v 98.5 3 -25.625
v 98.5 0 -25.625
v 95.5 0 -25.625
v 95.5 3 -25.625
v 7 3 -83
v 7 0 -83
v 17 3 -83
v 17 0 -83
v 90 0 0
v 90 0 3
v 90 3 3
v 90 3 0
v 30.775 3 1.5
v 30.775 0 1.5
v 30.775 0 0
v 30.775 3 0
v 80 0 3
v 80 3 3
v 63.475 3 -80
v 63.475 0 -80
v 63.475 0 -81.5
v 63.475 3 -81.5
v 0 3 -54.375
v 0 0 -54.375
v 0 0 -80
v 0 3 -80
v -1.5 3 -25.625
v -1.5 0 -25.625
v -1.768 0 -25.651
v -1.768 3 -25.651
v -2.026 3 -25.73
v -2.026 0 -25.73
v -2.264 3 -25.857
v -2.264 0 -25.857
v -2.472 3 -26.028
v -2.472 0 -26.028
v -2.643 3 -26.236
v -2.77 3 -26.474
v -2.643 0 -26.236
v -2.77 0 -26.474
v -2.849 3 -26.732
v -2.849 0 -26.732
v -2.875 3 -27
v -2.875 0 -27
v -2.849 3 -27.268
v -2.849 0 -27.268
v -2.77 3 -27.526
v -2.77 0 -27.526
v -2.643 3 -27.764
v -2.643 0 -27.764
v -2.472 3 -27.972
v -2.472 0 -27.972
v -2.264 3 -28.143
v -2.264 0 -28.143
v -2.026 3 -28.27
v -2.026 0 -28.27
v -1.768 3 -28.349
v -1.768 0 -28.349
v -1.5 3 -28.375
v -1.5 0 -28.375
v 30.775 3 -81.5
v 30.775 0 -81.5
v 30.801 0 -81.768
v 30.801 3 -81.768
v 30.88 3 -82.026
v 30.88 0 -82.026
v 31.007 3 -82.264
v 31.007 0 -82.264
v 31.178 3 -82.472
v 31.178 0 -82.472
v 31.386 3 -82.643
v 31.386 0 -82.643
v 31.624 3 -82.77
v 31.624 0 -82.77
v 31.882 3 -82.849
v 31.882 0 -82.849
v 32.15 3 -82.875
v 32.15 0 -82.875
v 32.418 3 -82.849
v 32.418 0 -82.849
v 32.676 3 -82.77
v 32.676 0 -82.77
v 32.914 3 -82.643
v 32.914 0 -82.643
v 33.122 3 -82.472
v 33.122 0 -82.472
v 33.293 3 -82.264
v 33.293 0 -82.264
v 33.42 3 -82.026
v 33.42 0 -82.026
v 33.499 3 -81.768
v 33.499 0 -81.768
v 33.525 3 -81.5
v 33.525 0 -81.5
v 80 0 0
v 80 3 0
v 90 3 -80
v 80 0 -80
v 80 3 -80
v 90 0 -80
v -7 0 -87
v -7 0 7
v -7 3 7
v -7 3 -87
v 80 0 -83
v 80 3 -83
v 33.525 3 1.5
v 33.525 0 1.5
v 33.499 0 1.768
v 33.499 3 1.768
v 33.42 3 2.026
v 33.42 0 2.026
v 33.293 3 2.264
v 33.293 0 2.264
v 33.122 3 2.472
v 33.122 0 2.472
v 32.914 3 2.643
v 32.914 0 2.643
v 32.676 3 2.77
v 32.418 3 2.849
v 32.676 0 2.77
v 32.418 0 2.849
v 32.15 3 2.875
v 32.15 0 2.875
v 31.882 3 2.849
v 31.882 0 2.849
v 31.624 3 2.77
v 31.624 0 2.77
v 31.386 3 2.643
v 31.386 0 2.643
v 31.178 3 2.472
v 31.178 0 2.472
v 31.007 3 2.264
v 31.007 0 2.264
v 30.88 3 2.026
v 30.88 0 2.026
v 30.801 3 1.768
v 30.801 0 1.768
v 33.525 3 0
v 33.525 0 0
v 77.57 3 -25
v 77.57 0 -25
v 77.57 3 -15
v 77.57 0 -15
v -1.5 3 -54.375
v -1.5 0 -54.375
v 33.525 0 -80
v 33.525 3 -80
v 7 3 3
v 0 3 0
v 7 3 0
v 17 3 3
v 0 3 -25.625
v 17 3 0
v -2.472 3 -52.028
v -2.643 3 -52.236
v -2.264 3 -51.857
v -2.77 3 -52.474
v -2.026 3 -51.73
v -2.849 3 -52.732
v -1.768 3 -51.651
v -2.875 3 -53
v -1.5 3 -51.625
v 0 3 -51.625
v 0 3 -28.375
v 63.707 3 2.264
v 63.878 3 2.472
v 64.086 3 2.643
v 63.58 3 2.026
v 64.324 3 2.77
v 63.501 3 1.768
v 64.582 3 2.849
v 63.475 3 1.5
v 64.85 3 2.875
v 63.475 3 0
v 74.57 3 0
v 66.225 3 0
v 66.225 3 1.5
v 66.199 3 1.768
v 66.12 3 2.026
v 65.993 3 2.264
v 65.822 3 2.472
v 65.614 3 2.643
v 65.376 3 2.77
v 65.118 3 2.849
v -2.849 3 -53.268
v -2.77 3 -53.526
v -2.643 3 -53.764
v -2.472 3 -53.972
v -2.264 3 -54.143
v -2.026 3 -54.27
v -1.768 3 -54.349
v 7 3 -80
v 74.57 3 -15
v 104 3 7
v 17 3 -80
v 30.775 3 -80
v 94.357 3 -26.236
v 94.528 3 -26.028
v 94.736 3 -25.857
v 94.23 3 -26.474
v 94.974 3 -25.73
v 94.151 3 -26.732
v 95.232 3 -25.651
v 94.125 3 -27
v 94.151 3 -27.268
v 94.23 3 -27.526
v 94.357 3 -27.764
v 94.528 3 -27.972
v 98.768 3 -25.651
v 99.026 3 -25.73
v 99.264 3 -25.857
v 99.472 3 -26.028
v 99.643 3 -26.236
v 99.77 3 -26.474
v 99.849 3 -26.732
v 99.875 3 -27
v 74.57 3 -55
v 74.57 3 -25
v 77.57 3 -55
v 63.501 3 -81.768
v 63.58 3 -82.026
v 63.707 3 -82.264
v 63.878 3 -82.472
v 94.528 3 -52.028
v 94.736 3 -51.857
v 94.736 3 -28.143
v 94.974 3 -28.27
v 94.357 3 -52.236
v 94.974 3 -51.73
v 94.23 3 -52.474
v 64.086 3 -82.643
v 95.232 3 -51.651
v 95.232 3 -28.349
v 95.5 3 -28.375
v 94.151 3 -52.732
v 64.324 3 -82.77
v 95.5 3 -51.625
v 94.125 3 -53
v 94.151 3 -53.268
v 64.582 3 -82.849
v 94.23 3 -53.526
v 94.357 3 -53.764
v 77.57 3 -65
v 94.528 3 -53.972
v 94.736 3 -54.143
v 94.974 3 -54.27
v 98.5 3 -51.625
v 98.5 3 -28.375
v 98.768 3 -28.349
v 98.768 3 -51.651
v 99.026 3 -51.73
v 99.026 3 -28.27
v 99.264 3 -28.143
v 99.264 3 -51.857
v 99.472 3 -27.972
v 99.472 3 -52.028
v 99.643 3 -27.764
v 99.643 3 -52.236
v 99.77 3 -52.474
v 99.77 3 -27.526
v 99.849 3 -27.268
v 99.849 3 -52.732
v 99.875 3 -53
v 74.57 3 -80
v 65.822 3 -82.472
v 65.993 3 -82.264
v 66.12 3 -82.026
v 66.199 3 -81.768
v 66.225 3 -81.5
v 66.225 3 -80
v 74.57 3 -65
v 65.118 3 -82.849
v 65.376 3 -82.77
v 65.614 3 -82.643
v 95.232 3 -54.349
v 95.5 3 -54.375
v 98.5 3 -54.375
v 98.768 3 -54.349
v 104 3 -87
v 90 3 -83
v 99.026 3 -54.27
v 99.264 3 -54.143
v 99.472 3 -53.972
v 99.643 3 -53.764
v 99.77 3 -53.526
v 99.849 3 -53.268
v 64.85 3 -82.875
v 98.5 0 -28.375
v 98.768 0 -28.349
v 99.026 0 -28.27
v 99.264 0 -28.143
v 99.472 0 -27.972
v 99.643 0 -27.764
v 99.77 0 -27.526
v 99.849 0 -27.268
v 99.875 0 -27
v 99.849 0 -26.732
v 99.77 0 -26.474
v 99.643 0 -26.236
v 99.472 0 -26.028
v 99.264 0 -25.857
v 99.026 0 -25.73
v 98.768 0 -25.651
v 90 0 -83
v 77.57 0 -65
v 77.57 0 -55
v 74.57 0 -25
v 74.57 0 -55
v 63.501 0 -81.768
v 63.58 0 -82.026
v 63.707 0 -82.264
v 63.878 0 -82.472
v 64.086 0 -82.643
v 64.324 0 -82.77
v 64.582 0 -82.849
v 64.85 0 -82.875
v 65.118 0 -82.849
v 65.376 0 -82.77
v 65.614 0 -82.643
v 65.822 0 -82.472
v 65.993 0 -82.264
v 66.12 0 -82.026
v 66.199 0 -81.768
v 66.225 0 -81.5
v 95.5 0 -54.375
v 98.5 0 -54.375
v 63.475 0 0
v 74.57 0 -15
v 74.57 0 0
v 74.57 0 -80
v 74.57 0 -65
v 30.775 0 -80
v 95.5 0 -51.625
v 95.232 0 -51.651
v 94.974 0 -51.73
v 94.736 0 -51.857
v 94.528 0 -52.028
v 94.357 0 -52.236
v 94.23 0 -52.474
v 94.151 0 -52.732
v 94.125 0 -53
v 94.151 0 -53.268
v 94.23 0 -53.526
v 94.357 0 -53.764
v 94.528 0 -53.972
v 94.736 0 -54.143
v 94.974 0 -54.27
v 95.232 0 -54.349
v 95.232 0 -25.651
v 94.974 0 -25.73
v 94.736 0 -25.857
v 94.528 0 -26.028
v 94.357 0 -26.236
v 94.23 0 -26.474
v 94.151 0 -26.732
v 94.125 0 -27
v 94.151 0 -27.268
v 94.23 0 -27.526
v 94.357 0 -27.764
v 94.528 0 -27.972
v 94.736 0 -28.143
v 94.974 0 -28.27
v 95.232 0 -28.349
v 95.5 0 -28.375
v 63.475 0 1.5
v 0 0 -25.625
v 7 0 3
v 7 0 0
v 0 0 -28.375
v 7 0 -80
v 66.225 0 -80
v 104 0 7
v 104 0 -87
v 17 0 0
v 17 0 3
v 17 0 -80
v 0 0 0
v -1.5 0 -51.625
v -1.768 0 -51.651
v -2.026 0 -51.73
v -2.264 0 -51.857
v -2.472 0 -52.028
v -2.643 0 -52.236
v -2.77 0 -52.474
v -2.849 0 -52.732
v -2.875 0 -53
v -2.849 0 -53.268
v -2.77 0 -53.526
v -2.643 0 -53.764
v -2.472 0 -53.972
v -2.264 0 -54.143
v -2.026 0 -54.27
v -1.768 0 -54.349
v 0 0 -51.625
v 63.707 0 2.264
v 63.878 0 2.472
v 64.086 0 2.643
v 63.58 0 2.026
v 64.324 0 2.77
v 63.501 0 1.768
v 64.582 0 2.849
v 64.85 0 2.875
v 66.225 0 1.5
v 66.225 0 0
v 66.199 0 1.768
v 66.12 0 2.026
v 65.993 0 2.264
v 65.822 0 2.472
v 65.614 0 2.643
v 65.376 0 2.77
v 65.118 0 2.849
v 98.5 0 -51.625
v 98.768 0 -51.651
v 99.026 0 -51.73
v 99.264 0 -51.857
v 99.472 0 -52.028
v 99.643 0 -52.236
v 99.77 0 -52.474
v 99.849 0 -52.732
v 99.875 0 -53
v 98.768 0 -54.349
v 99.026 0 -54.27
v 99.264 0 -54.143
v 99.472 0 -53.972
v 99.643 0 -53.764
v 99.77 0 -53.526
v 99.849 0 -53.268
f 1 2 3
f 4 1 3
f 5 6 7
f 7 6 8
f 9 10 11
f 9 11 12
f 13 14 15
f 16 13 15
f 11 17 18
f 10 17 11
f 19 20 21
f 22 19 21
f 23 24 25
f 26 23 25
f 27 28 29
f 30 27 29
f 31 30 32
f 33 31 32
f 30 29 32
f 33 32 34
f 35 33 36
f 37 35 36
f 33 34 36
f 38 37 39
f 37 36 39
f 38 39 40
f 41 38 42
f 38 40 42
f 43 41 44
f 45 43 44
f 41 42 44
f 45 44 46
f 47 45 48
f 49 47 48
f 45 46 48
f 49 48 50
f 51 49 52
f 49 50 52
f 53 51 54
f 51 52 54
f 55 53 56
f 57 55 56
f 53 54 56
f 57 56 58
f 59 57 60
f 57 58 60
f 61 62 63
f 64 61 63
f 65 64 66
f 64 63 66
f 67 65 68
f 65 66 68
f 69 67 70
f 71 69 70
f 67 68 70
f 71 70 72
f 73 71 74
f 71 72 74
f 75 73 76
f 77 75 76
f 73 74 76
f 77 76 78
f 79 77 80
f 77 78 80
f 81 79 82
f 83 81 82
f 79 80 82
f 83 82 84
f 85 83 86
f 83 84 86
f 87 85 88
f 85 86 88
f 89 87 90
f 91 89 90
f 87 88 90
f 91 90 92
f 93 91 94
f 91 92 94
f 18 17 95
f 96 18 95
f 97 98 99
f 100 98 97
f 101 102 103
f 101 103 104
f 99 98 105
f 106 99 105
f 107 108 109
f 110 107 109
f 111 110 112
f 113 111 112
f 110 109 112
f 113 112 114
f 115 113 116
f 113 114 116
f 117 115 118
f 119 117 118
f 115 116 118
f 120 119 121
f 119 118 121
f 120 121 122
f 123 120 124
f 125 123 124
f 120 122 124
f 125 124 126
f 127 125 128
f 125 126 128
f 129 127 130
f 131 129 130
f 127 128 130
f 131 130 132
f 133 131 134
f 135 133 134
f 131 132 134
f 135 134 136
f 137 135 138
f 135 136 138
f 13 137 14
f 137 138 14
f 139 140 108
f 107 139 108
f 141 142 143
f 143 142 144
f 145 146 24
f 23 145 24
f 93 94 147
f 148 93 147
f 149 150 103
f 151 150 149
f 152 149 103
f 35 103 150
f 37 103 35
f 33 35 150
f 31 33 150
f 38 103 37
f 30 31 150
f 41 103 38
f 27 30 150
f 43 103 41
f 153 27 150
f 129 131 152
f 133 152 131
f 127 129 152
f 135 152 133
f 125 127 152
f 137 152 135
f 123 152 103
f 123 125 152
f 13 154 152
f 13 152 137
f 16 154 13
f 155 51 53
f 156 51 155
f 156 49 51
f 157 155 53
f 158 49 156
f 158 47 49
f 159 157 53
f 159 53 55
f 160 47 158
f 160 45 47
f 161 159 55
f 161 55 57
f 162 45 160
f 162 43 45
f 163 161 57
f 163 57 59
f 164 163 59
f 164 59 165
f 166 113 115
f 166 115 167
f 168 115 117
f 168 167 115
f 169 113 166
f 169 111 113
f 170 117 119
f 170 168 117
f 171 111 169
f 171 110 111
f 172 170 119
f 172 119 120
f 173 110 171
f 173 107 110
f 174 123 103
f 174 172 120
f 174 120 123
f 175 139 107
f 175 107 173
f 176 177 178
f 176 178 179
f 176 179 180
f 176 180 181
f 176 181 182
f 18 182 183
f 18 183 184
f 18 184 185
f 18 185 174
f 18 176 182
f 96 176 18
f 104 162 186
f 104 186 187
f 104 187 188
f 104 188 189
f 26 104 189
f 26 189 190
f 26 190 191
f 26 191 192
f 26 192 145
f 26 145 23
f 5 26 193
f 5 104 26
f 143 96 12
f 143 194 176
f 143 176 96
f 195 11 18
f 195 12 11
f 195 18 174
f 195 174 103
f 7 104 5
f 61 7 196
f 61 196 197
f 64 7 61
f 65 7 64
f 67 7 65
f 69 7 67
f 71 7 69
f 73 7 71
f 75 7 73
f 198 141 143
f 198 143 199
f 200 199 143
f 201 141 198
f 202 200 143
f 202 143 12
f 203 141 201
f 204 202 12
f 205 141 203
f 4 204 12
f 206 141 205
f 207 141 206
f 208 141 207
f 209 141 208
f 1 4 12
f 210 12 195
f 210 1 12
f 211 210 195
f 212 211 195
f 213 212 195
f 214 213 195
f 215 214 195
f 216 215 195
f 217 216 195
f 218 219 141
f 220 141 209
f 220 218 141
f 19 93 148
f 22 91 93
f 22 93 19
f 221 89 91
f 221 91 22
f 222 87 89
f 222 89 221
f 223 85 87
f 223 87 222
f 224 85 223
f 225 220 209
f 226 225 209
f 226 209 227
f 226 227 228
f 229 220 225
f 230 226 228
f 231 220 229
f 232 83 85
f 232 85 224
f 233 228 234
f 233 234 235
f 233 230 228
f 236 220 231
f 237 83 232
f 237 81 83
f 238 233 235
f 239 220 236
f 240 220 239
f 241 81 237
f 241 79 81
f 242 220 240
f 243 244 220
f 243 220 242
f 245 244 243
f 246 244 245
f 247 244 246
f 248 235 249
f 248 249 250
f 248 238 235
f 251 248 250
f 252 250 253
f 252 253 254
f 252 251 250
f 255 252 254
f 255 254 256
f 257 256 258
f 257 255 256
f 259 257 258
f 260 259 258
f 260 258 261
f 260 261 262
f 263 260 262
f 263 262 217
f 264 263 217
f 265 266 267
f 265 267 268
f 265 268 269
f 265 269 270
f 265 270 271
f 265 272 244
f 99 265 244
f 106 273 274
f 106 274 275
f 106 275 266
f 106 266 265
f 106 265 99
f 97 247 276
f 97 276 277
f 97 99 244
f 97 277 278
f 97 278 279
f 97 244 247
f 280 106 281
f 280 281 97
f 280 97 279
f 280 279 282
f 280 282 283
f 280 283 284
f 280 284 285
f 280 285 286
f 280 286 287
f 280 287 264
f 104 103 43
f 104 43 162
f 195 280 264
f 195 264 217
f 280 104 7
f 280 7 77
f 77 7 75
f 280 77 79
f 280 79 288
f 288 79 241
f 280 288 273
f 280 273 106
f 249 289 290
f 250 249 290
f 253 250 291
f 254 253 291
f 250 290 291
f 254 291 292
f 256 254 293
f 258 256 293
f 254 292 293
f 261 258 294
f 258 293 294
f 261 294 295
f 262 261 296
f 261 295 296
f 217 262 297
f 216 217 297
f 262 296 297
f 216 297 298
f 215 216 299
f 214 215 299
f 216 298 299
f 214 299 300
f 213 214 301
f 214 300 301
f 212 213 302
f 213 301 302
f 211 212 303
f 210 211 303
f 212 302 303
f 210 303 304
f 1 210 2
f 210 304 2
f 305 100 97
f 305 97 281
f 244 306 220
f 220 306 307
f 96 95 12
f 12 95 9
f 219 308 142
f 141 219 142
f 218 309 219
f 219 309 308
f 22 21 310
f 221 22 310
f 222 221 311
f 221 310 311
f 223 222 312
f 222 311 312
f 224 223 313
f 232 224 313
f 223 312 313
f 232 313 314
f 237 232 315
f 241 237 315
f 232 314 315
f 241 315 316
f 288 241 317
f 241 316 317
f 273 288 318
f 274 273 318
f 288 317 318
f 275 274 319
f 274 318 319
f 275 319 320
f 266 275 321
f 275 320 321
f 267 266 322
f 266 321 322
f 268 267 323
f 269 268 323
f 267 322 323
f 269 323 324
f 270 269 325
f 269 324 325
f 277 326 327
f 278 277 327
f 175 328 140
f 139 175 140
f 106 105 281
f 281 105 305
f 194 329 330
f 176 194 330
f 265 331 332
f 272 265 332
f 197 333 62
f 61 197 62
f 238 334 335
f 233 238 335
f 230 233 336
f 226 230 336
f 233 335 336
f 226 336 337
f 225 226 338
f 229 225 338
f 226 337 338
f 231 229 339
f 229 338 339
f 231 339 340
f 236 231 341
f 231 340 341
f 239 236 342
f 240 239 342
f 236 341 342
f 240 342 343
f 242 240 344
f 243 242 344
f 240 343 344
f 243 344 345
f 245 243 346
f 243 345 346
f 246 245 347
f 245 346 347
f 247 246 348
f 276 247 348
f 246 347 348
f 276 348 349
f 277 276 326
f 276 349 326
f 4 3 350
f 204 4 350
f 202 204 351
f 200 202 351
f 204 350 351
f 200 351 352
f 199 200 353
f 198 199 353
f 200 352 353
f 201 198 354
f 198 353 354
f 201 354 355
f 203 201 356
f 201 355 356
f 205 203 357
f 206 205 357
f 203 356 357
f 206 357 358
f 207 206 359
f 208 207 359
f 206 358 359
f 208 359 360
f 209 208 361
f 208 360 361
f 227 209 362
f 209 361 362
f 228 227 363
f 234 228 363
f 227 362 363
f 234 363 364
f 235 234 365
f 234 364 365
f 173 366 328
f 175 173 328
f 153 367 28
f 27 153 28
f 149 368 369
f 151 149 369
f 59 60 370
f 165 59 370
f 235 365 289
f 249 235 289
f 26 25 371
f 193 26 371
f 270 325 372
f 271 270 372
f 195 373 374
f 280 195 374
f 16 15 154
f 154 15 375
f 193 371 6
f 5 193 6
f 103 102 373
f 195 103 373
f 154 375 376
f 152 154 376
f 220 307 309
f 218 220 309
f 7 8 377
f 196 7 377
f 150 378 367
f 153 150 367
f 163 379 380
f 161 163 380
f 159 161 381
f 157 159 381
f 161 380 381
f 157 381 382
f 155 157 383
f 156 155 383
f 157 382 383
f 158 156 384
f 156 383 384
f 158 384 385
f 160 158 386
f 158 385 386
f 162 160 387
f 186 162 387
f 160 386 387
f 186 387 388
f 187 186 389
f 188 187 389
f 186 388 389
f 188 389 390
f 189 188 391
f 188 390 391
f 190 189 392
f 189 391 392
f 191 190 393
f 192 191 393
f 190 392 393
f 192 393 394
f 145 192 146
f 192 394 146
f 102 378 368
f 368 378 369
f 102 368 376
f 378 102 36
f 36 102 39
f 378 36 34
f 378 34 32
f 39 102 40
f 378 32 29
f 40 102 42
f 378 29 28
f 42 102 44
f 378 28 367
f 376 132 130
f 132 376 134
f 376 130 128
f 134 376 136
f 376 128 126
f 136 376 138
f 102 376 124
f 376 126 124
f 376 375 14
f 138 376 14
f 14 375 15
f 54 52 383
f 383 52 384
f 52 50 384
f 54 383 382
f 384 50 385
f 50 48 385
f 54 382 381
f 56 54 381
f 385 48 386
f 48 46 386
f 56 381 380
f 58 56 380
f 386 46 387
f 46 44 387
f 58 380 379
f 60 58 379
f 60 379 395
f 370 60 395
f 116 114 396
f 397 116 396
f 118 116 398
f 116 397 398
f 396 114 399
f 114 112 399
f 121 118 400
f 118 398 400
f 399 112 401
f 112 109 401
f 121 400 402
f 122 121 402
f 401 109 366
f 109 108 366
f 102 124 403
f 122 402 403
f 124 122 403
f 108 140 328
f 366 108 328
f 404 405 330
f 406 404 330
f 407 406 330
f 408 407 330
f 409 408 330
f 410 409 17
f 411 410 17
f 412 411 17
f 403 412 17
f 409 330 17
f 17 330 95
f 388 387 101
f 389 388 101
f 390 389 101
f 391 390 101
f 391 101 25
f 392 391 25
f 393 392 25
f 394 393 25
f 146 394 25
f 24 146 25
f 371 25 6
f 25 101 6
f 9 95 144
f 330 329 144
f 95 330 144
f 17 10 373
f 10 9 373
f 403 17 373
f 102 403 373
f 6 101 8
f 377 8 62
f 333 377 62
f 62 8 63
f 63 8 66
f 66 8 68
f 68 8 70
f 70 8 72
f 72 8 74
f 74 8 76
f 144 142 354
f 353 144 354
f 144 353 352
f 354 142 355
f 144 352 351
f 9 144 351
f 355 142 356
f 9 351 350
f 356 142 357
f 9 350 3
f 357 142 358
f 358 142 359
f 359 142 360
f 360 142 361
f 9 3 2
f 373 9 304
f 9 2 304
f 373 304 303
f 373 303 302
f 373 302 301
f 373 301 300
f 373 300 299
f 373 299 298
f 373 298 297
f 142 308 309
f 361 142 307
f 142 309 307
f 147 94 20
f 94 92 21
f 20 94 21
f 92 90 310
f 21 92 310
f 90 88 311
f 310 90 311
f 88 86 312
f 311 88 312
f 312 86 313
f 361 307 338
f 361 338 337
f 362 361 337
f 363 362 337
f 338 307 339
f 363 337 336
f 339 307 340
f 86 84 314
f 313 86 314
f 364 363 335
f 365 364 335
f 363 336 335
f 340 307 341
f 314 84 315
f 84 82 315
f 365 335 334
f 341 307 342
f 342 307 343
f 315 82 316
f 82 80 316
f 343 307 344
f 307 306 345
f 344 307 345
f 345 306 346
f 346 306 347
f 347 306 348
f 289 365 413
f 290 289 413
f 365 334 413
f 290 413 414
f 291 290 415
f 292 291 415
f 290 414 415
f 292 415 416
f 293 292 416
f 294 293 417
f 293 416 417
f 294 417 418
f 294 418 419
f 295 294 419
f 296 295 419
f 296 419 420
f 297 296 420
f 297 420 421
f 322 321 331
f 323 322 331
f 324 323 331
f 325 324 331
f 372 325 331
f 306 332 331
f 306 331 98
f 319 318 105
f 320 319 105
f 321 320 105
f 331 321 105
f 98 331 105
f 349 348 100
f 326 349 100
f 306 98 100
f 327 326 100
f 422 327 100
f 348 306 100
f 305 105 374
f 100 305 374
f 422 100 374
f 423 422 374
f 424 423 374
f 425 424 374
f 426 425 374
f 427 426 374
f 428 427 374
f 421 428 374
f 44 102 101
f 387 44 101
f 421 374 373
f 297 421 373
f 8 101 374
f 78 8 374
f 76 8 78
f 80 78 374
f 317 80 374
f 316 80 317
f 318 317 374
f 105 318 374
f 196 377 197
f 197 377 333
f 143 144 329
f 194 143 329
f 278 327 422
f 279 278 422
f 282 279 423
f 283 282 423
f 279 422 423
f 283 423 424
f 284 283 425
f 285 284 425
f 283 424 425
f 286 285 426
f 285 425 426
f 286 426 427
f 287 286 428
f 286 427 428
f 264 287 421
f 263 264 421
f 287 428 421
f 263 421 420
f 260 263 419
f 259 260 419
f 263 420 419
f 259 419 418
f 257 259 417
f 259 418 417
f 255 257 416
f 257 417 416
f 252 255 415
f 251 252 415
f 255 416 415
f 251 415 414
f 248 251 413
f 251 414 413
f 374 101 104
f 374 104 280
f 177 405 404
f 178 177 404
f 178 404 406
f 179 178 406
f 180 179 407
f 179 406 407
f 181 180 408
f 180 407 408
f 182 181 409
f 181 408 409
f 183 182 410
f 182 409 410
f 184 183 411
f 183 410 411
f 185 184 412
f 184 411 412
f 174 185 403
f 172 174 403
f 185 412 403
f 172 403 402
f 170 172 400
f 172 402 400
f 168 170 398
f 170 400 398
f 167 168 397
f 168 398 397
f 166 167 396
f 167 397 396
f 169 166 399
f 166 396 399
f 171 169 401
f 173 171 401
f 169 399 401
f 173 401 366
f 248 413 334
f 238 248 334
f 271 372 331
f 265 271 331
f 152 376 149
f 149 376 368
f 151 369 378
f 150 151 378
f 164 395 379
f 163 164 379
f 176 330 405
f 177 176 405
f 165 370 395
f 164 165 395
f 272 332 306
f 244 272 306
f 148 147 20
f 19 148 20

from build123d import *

# Parameters (mm, degrees)
CROQUIS1_W              = 111
CROQUIS1_H              = 94
CROQUIS1_W_2            = 10
CROQUIS1_H_2            = 3
SALIENTE_EXTRUIR1_DEPTH = 3


with BuildPart() as part:
    # Croquis1 → Saliente-Extruir1 (new body)
    with BuildSketch(Plane(origin=(0, 0, 0), x_dir=(1, 0, 0), z_dir=(0, 1, 0))):
        with Locations((48.5, 40)):
            Rectangle(CROQUIS1_W, CROQUIS1_H)
        with BuildLine():
            Line((7, 0), (0, 0))
            Line((0, 0), (0, 25.625))
            Line((0, 25.625), (-1.5, 25.625))
            ThreePointArc((-1.5, 25.625), (-2.875, 27), (-1.5, 28.375))
            Line((-1.5, 28.375), (0, 28.375))
            Line((0, 28.375), (0, 51.625))
            Line((0, 51.625), (-1.5, 51.625))
            ThreePointArc((-1.5, 51.625), (-2.875, 53), (-1.5, 54.375))
            Line((-1.5, 54.375), (0, 54.375))
            Line((0, 54.375), (0, 80))
            Line((0, 80), (7, 80))
            Line((7, 80), (7, 83))
            Line((7, 83), (17, 83))
            Line((17, 83), (17, 80))
            Line((17, 80), (30.775145502, 80))
            Line((30.775145502, 80), (30.775000006, 81.499866617))
            ThreePointArc((30.775000006, 81.499866617), (32.149933309, 82.874999998), (33.525, 81.5))
            Line((33.525, 81.5), (33.525, 80))
            Line((33.525, 80), (63.475, 80))
            Line((63.475, 80), (63.475, 81.500066988))
            ThreePointArc((63.475, 81.500066988), (64.850028215, 82.875038772), (66.225, 81.500010557))
            Line((66.225, 81.500010557), (66.225, 80))
            Line((66.225, 80), (66.475145502, 80))
            Line((66.475145502, 80), (74.57, 80))
            Line((74.57, 80), (74.57, 65))
            Line((74.57, 65), (77.57, 65))
            Line((77.57, 65), (77.57, 55))
            Line((77.57, 55), (74.57, 55))
            Line((74.57, 55), (74.57, 25))
            Line((74.57, 25), (77.57, 25))
            Line((77.57, 25), (77.57, 15))
            Line((77.57, 15), (74.57, 15))
            Line((74.57, 15), (74.57, 0))
            Line((74.57, 0), (66.225, 0))
            Line((66.225, 0), (66.225, -1.500010557))
            ThreePointArc((66.225, -1.500010557), (64.850028215, -2.875038772), (63.475, -1.500066988))
            Line((63.475, -1.500066988), (63.475, 0))
            Line((63.475, 0), (33.525, 0))
            Line((33.525, 0), (33.525, -1.5))
            ThreePointArc((33.525, -1.5), (32.149933309, -2.874999998), (30.775000006, -1.499866617))
            Line((30.775000006, -1.499866617), (30.775145502, 0))
            Line((30.775145502, 0), (17, 0))
            Line((17, 0), (17, -3))
            Line((17, -3), (7, -3))
            Line((7, -3), (7, 0))
        make_face(mode=Mode.SUBTRACT)
        with Locations((85, -1.5)):
            Rectangle(CROQUIS1_W_2, CROQUIS1_H_2, mode=Mode.SUBTRACT)
        with BuildLine():
            ThreePointArc((98.5, 28.375), (99.875, 27), (98.5, 25.625))
            Line((98.5, 25.625), (95.5, 25.625))
            ThreePointArc((95.5, 25.625), (94.125, 27), (95.5, 28.375))
            Line((95.5, 28.375), (98.5, 28.375))
        make_face(mode=Mode.SUBTRACT)
        with BuildLine():
            ThreePointArc((98.5, 54.375), (99.875, 53), (98.5, 51.625))
            Line((98.5, 51.625), (95.5, 51.625))
            ThreePointArc((95.5, 51.625), (94.125, 53), (95.5, 54.375))
            Line((95.5, 54.375), (98.5, 54.375))
        make_face(mode=Mode.SUBTRACT)
        with Locations((85, 81.5)):
            Rectangle(CROQUIS1_W_2, CROQUIS1_H_2, mode=Mode.SUBTRACT)
    extrude(amount=SALIENTE_EXTRUIR1_DEPTH)


solid = part.part
